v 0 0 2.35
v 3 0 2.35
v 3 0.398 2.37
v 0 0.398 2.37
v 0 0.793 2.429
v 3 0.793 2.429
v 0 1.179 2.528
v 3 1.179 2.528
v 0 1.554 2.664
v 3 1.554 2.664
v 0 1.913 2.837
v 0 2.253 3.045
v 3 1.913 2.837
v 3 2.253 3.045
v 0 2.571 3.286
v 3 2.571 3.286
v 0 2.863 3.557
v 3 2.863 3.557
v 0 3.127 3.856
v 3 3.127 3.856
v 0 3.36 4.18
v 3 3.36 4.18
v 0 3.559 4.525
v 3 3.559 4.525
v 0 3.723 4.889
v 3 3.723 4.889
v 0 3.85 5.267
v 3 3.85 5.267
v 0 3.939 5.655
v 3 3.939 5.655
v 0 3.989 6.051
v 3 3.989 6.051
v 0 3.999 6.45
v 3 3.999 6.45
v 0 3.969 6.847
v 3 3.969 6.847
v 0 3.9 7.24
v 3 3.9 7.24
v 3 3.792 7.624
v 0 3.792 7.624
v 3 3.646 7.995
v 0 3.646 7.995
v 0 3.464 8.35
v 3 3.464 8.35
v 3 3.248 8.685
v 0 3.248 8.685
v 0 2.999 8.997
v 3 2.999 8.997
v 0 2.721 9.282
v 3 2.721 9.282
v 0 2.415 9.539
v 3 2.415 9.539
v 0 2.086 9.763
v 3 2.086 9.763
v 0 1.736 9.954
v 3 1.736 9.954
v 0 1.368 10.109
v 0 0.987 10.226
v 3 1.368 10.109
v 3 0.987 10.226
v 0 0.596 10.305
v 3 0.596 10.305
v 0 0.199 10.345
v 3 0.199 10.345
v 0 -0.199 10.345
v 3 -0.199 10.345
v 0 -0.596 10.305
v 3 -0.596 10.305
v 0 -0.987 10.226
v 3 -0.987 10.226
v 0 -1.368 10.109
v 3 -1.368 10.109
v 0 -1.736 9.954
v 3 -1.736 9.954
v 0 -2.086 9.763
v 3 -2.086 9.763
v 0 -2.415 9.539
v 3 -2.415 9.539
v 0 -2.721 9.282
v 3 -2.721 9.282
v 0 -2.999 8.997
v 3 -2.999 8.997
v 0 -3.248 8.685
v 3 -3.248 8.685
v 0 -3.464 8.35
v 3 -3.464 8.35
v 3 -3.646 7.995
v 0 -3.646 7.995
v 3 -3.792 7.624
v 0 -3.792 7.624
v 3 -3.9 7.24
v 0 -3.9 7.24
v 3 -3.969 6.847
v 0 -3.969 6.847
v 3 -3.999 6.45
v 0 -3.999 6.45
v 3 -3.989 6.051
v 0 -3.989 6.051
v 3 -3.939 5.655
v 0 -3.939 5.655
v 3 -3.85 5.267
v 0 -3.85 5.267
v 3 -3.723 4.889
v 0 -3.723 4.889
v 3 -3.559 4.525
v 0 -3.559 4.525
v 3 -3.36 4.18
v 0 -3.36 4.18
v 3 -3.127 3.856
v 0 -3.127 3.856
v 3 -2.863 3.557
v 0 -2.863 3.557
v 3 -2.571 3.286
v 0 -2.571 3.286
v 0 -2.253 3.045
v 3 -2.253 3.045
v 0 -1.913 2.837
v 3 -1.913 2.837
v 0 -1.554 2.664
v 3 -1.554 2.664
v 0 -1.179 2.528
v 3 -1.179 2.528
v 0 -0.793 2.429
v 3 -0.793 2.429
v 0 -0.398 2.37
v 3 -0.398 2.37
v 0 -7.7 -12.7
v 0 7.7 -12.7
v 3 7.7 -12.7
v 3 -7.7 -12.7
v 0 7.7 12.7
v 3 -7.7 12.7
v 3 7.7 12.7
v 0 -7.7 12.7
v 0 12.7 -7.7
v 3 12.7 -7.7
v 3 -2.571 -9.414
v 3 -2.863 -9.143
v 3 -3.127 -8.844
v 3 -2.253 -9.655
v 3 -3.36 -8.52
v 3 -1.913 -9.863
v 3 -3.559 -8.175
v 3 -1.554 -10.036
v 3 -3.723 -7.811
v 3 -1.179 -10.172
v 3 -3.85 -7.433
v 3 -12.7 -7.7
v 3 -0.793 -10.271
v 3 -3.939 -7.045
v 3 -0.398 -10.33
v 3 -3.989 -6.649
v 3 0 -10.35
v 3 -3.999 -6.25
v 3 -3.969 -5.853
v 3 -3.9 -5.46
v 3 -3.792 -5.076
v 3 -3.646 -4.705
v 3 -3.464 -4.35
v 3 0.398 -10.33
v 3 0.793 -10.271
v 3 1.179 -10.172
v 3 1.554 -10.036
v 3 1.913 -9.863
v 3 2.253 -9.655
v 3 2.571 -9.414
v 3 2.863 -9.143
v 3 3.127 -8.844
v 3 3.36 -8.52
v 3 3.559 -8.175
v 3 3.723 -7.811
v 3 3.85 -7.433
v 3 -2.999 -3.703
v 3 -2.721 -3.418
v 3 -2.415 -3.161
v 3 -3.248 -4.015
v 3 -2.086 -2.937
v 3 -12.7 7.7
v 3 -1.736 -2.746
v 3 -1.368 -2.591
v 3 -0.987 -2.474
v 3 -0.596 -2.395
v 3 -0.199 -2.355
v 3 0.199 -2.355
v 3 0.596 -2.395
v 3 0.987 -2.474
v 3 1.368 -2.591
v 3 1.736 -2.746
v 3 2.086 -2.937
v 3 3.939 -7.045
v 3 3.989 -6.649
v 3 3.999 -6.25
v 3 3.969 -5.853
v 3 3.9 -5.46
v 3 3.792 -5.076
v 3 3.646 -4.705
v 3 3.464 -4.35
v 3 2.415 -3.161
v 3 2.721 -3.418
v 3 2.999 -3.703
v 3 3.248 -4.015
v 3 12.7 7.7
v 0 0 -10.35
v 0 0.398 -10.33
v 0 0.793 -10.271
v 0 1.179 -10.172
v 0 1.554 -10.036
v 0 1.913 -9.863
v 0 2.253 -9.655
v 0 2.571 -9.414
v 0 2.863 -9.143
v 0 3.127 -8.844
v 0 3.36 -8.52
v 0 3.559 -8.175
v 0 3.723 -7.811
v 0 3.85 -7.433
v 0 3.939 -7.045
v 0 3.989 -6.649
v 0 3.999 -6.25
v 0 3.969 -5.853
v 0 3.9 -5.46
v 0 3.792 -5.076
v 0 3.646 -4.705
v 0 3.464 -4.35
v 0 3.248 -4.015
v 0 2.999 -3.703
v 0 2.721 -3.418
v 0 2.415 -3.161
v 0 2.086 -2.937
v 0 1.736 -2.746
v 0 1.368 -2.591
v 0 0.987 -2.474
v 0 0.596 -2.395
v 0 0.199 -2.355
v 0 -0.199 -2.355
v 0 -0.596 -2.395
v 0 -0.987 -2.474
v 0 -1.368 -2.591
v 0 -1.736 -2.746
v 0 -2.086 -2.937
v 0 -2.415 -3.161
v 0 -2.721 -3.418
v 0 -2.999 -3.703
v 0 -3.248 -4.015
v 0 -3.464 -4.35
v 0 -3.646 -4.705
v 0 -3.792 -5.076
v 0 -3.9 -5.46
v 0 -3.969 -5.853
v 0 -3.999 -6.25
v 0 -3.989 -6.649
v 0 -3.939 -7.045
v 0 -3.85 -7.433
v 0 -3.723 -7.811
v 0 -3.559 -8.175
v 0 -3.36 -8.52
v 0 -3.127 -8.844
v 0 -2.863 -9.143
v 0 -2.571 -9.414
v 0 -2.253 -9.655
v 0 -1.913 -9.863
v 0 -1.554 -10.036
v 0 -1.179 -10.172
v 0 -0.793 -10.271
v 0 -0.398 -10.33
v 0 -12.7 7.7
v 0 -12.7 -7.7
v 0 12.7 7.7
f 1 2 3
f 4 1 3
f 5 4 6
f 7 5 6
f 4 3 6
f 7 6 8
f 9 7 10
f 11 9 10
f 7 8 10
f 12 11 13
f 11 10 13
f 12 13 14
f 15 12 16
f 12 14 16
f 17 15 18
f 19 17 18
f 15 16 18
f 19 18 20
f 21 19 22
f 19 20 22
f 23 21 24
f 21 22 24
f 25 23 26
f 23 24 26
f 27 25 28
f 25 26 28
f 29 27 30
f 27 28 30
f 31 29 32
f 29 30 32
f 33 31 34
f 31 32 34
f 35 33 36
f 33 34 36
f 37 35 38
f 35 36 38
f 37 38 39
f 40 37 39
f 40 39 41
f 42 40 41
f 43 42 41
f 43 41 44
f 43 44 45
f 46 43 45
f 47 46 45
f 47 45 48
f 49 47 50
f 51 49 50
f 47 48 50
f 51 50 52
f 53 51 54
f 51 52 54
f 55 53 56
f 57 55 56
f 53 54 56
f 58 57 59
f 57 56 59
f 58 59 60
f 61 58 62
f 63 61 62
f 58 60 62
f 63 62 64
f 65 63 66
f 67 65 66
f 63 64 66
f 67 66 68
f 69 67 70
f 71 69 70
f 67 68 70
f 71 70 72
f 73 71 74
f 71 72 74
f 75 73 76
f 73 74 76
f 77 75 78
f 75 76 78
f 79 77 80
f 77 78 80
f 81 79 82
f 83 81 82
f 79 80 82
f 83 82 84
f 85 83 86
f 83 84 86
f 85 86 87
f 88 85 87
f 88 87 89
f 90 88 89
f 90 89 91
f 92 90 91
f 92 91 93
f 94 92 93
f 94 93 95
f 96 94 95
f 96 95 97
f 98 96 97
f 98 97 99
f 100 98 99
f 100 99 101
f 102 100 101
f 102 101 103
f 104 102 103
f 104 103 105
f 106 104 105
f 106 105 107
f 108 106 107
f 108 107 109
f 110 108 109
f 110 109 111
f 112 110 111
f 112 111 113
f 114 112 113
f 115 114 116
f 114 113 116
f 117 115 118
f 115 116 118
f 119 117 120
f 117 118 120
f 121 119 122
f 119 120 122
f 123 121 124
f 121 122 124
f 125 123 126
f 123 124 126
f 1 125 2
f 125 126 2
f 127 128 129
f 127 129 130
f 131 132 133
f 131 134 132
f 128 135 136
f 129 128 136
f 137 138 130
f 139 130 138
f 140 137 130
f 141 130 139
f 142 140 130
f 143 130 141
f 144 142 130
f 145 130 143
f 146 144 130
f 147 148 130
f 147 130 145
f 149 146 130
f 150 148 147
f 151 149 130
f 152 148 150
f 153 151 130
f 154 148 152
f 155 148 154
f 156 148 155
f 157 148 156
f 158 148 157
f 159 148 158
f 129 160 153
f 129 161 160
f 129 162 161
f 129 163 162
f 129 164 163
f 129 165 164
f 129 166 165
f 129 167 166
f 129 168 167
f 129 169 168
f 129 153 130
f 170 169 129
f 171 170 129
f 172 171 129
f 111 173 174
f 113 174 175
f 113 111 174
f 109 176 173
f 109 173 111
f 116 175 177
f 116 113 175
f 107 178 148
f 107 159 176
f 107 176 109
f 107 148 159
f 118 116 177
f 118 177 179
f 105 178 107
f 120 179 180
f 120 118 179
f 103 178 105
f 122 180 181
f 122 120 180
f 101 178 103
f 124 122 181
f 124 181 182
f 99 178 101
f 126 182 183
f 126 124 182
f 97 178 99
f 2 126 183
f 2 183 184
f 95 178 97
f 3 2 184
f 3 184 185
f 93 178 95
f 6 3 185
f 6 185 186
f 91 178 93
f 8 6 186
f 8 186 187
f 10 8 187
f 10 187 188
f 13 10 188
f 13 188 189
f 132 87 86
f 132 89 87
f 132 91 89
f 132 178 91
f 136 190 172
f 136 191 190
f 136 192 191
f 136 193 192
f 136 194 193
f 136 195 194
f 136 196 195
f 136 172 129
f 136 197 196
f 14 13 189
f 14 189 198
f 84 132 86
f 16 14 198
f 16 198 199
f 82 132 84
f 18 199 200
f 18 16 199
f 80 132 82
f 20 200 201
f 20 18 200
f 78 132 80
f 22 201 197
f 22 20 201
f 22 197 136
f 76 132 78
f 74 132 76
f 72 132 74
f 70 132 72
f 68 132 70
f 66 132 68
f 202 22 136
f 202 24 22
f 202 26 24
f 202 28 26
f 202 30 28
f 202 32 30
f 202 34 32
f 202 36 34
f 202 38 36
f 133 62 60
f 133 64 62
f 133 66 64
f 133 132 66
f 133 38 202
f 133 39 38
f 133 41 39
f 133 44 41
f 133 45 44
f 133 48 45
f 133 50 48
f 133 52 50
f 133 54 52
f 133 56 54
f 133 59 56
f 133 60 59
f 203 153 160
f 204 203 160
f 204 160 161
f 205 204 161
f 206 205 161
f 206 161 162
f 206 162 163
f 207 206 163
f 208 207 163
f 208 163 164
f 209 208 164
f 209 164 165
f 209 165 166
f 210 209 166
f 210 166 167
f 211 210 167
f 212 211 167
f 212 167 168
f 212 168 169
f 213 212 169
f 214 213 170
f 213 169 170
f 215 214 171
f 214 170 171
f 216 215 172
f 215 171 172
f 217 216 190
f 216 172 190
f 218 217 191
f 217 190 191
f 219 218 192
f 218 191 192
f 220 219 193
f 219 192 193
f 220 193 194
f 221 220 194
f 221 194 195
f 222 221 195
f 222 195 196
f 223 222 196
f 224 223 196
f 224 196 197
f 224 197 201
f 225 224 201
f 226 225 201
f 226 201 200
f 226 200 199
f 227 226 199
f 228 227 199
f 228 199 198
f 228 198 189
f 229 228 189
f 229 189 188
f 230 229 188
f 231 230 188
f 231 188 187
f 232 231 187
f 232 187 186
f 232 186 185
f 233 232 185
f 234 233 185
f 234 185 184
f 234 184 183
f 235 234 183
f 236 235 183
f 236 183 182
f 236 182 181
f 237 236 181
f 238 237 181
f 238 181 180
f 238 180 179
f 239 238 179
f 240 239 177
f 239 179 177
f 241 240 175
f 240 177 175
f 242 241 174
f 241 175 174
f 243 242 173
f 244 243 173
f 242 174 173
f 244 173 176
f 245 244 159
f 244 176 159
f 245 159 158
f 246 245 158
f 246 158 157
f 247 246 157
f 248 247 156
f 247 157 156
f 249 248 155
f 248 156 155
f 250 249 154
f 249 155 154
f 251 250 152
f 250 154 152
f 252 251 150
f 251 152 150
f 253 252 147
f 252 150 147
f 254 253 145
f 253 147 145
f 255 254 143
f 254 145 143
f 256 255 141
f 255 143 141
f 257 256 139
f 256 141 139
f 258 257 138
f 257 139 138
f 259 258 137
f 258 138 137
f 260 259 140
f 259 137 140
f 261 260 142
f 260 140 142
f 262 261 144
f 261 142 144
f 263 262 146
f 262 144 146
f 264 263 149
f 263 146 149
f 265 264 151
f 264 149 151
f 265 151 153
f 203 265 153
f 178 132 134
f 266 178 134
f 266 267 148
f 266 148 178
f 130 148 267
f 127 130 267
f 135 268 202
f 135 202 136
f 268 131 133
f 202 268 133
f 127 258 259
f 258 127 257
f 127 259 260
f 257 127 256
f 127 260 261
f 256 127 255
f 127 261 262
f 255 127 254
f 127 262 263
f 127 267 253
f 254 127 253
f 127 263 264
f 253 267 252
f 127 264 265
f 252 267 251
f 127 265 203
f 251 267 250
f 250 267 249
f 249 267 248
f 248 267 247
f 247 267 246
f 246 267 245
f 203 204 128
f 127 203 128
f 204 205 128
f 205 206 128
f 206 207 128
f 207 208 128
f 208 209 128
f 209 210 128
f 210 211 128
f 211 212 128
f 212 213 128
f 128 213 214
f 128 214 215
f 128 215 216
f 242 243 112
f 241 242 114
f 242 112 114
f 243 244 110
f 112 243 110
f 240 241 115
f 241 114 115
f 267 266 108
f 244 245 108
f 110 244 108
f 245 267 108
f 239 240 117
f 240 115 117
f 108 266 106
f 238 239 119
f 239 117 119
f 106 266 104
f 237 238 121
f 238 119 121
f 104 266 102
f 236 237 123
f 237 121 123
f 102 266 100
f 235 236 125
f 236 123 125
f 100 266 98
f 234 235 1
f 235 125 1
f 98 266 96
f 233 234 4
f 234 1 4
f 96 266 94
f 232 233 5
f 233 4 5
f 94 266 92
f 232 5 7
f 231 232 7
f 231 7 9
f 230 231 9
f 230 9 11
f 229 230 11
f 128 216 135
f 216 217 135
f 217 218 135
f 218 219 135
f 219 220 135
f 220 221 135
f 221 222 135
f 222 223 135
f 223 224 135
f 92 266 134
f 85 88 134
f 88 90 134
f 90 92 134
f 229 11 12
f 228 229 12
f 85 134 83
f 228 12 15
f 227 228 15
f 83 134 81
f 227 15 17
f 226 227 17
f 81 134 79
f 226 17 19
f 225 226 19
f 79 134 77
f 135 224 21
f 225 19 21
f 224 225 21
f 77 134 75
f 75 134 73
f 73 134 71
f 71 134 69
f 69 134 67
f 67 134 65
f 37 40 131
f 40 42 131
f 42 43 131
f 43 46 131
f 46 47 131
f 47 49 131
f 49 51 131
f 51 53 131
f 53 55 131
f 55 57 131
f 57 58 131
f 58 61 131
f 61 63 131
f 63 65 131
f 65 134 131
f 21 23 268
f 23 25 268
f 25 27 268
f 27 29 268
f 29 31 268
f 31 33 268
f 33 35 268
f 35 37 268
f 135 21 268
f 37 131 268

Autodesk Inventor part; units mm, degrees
ref_plane "YZ Plane" through (0, 0, 0) normal (1, 0, 0) x (0, 1, 0)
ref_plane "XZ Plane" through (0, 0, 0) normal (0, 1, 0) x (-1, 0, 0)
ref_plane "XY Plane" through (0, 0, 0) normal (0, 0, 1) x (1, 0, 0)
sketch "Sketch1" plane through (0, 0, 0) normal (1, 0, 0) x (0, 1, 0)
  line L0 (-12.7, 12.7) -> (12.7, 12.7)
  line L1 (12.7, 12.7) -> (12.7, -12.7)
  line L2 (12.7, -12.7) -> (-12.7, -12.7)
  line L3 (-12.7, -12.7) -> (-12.7, 12.7)
  line L4 (-12.7, 12.7) -> (12.7, -12.7) construction
  line L5 (12.7, 12.7) -> (-12.7, -12.7) construction
  point P0 (0, 0)
  dimension "d0" = 25.4
  dimension "d1" = 25.4
extrude "Extrusion1" add sketch "Sketch1" along normal blind 3
sketch "Sketch2" plane through (3, 0, 0) normal (1, 0, 0) x (0, 0, -1)
  line L0 (12.7, -12.7) -> (12.7, 12.7) projected
  line L1 (12.7, 12.7) -> (-12.7, 12.7) projected
  line L2 (-12.7, 12.7) -> (-12.7, -12.7) projected
  line L3 (-12.7, -12.7) -> (12.7, -12.7) projected
  line L4 (0, 12.7) -> (0, -12.7)
  circle A0 centre (-6.35, 0) radius 4
  line L5 (-11.85, 3.1754) -> (-6.35, 6.3509)
  line L6 (-6.35, 6.3509) -> (-0.85, 3.1754)
  line L7 (-0.85, 3.1754) -> (-0.85, -3.1754)
  line L8 (-0.85, -3.1754) -> (-6.35, -6.3509)
  line L9 (-6.35, -6.3509) -> (-11.85, -3.1754)
  line L10 (-11.85, -3.1754) -> (-11.85, 3.1754)
  circle A1 centre (6.35, 0) radius 4
  line L11 (11.85, 3.1754) -> (6.35, 6.3509)
  line L12 (6.35, 6.3509) -> (0.85, 3.1754)
  line L13 (0.85, 3.1754) -> (0.85, -3.1754)
  line L14 (0.85, -3.1754) -> (6.35, -6.3509)
  line L15 (6.35, -6.3509) -> (11.85, -3.1754)
  line L16 (11.85, -3.1754) -> (11.85, 3.1754)
  point P0 (0, 0)
  point P1 (0, 0)
  point P2 (-0.85, 0)
  point P3 (0.85, 0)
  dimension "d4" = 8
  dimension "d5" = 6.35
  dimension "d6" = 11
extrude "Extrusion2" cut sketch "Sketch2" against normal blind 3 contours A0 | A1
chamfer "Chamfer1" distance 5 angle 45 4 edges at (1.5, -12.7, -12.7) (1.5, -12.7, 12.7) (1.5, 12.7, 12.7) (1.5, 12.7, -12.7)
properties part number "ACOPLE_TORNILLO_DOBLE" material "Steel, Mild, Welded"
